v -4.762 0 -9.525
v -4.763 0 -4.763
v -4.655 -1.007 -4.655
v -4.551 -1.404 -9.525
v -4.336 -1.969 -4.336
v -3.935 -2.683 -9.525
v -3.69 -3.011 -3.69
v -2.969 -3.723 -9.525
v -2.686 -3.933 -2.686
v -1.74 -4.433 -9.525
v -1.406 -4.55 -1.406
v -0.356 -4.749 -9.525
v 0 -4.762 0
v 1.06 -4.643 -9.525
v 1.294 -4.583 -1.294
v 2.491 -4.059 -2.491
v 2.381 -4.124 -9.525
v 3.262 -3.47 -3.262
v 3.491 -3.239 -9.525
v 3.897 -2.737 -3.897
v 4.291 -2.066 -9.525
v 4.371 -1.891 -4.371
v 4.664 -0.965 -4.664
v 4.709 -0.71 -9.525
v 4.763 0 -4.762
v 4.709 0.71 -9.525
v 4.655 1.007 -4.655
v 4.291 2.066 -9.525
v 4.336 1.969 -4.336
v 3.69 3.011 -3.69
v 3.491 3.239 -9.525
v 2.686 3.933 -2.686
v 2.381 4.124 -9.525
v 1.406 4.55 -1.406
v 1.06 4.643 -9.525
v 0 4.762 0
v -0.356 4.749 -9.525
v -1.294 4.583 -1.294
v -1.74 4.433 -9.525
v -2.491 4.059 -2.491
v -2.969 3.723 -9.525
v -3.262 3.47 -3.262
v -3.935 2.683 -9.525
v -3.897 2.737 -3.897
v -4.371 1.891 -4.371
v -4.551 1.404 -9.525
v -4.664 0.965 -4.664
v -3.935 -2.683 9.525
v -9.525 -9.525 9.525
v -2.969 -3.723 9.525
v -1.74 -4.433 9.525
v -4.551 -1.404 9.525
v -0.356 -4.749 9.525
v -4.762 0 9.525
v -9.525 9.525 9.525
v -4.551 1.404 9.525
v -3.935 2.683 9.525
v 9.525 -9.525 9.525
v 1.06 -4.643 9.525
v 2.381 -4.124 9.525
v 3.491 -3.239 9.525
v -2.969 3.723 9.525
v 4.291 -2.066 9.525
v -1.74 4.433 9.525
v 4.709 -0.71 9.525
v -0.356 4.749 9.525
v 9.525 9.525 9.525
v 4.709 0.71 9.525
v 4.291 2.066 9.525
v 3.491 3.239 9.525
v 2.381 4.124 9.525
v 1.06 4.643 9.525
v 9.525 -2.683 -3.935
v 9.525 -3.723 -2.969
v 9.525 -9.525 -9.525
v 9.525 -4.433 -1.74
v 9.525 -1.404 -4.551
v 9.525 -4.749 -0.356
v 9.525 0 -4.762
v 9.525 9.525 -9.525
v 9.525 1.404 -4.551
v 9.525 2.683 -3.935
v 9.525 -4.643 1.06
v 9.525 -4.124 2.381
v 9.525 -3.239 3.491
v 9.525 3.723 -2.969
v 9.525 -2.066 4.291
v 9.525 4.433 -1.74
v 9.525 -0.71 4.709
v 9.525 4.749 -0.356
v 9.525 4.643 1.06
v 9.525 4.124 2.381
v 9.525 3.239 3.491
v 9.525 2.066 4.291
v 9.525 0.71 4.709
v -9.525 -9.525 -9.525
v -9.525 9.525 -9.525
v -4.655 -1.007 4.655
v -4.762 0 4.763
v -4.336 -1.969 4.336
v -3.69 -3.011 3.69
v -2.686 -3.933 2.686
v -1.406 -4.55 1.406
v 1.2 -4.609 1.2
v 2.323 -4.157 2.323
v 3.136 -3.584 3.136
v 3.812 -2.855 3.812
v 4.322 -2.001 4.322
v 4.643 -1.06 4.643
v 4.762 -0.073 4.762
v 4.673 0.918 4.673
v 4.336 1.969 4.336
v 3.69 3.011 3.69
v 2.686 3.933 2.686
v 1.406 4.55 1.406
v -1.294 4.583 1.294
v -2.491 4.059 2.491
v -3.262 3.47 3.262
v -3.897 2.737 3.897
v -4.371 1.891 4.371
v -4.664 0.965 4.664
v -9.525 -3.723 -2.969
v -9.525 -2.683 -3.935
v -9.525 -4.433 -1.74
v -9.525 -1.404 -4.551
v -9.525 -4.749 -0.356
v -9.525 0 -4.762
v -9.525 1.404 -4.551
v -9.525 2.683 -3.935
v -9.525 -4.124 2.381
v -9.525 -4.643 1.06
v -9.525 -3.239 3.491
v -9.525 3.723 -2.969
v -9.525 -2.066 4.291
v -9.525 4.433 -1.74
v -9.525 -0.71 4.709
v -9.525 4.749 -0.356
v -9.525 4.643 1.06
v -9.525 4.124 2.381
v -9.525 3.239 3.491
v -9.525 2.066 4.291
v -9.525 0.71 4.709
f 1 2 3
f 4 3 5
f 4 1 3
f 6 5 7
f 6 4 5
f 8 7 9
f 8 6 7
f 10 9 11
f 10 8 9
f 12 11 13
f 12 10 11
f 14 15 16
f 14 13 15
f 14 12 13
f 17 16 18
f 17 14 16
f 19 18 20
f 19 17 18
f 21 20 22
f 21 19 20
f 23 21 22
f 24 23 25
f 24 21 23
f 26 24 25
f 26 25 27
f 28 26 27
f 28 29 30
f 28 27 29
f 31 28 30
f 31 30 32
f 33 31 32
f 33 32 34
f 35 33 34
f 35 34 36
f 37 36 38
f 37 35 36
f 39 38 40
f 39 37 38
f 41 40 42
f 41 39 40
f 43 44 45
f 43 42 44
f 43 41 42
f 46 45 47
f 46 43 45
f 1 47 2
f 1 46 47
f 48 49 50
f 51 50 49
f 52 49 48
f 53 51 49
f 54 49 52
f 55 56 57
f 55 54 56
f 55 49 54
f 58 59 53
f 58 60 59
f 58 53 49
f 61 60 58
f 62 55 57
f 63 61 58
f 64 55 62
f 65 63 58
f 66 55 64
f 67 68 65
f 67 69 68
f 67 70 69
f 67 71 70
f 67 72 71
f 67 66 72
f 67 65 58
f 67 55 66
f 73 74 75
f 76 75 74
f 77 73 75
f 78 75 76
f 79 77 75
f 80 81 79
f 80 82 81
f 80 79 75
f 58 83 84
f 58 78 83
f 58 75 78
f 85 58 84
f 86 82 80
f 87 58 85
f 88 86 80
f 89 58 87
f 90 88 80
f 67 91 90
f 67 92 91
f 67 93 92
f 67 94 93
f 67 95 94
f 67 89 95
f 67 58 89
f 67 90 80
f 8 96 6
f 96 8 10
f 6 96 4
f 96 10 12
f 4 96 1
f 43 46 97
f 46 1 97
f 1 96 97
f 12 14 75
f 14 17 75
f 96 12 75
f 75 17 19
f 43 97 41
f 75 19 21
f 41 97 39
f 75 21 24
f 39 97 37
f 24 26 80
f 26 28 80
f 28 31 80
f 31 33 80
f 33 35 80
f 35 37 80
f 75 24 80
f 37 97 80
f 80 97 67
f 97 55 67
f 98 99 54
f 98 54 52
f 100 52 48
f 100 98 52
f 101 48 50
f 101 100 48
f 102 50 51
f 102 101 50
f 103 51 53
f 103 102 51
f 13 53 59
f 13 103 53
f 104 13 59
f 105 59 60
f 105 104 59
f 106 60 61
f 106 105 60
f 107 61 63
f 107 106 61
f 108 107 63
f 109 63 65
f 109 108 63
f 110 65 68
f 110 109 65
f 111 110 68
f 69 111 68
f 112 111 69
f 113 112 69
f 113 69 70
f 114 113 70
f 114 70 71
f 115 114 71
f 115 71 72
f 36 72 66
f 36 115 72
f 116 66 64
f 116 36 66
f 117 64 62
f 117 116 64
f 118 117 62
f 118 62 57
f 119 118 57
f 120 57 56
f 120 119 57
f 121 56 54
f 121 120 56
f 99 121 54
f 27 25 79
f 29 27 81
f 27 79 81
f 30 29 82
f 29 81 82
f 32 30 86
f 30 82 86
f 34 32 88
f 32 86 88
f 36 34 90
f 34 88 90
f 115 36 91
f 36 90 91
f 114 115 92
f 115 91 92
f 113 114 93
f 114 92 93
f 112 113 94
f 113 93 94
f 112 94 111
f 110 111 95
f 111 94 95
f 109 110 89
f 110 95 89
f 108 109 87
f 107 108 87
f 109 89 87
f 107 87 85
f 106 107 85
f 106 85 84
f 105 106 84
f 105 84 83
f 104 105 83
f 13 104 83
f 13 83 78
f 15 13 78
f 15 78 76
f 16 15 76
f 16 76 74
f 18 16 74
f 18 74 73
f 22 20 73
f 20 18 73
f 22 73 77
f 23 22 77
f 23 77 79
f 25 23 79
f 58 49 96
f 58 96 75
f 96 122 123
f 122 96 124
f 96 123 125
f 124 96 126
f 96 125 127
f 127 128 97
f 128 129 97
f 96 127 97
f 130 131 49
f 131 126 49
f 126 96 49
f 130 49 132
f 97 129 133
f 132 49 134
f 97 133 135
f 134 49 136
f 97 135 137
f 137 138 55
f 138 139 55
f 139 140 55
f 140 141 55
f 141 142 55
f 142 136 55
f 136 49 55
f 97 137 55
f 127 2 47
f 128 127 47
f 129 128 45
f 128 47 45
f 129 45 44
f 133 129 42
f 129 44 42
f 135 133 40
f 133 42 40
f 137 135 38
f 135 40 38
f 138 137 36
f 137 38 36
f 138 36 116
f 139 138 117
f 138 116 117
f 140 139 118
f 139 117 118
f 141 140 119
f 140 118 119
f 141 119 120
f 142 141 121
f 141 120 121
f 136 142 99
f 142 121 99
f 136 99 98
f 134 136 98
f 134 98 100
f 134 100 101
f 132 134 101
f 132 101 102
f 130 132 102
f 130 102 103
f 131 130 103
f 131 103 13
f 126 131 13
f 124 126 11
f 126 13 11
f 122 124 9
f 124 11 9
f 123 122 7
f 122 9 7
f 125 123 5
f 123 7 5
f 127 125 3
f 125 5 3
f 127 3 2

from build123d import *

# Parameters (mm, degrees)
SKETCH1_W          = 19.05
SKETCH1_H          = 19.05
SKETCH1_R          = 4.7625
BASE_EXTRUDE_DEPTH = 9.525
SKETCH3_R          = 4.7625
CUT_EXTRUDE1_DEPTH = 24.3313898


with BuildPart() as part:
    # Sketch1 → Base-Extrude (new, symmetric)
    with BuildSketch(Plane.XY):
        Rectangle(SKETCH1_W, SKETCH1_H)
        with Locations(Location((0, 0, 0), (0, 0, 180))):
            Circle(SKETCH1_R, mode=Mode.SUBTRACT)
    extrude(amount=BASE_EXTRUDE_DEPTH, both=True)

    # Sketch3 → Cut-Extrude1 (cut, through all)
    with BuildSketch(Plane(origin=(9.525, 0, 0), x_dir=(0, 0, -1), z_dir=(1, 0, 0))):
        Circle(SKETCH3_R)
    extrude(amount=-CUT_EXTRUDE1_DEPTH, mode=Mode.SUBTRACT)


solid = part.part
